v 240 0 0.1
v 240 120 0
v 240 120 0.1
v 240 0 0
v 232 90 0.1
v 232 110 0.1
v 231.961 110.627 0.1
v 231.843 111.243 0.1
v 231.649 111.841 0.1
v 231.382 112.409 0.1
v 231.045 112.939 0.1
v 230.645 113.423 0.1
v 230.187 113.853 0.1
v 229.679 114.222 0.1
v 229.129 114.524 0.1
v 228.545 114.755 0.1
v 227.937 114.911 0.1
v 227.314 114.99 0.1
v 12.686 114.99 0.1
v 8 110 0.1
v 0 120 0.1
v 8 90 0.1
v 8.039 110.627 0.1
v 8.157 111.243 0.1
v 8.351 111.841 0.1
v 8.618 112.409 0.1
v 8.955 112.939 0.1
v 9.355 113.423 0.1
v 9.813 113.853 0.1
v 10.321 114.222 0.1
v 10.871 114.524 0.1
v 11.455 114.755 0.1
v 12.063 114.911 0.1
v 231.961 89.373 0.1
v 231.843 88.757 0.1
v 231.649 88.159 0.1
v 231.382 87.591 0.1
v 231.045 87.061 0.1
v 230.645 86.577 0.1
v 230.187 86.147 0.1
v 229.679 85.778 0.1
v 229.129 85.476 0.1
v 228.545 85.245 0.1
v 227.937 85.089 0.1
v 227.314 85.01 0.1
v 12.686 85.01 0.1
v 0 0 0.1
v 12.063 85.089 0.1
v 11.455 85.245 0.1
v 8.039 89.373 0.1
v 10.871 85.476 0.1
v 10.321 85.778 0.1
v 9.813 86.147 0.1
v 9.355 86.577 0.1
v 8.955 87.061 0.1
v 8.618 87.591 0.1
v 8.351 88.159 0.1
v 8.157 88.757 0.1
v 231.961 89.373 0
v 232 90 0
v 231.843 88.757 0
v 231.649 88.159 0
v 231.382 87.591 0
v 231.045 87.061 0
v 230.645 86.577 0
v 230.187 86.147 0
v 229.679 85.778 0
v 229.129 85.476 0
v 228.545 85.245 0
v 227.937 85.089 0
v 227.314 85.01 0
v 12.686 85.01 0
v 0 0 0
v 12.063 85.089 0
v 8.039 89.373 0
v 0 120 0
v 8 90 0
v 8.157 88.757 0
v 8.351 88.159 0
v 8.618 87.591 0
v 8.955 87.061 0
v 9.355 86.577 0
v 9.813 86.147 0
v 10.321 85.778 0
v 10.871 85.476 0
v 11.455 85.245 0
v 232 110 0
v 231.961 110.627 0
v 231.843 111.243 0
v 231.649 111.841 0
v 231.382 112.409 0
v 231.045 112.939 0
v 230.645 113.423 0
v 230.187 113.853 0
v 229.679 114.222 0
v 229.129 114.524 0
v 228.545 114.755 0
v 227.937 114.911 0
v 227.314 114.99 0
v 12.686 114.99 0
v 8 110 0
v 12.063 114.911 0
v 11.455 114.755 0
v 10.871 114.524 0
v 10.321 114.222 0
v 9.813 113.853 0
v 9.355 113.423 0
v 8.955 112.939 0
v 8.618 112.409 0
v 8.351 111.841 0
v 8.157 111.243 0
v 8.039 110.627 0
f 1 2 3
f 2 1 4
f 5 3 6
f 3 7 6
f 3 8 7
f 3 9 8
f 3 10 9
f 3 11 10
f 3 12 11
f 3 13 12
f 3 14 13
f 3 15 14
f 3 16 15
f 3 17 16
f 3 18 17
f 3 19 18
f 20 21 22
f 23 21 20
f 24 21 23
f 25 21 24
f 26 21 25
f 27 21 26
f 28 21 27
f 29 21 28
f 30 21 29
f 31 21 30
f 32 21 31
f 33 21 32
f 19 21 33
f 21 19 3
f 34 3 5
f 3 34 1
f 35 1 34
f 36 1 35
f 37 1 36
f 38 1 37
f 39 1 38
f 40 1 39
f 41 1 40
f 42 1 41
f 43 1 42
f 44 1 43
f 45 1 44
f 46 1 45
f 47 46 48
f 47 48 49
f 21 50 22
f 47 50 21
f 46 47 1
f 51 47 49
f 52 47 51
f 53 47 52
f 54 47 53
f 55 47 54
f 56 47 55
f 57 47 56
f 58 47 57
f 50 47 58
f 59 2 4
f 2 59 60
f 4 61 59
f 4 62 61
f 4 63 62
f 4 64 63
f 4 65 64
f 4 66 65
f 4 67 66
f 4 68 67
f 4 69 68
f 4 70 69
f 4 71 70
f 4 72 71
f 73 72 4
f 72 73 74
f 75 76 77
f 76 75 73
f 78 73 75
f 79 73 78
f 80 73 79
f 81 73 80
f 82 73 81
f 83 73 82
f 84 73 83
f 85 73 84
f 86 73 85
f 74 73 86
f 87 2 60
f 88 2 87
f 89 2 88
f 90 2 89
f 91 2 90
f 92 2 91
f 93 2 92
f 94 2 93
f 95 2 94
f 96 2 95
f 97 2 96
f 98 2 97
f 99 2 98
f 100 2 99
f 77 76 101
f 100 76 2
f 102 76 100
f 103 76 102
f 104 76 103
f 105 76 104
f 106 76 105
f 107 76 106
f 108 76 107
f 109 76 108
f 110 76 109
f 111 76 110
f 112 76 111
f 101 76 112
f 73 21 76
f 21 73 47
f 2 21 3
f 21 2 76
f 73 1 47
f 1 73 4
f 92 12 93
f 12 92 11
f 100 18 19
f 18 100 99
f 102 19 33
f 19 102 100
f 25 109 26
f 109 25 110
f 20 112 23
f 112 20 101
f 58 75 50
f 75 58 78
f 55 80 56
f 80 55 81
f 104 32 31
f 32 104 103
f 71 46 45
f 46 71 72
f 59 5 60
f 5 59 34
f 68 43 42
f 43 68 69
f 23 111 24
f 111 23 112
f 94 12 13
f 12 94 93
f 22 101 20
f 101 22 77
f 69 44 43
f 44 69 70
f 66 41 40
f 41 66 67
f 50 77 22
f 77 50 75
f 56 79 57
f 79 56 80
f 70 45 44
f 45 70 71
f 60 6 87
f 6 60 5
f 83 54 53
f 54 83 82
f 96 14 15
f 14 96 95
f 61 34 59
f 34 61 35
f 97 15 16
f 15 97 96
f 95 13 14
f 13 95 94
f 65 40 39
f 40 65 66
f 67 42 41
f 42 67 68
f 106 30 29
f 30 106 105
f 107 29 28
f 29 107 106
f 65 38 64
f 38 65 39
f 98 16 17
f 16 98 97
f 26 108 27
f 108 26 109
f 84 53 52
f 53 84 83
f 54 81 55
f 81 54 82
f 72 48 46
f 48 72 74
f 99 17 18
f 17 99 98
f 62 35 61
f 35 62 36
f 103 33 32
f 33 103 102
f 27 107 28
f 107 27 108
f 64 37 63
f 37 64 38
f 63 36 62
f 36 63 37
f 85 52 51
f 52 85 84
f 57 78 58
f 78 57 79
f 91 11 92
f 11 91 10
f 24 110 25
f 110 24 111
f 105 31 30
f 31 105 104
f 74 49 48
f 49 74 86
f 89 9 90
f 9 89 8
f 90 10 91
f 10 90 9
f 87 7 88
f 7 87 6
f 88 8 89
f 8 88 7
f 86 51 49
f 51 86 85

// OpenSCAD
// -*- mode: c -*-
/* All distances are in mm. */

/* set output quality */
$fn = 50;

/* Distance between key centers. */
column_spacing   = 19;
row_spacing      = column_spacing;

/* This number should exceed row_spacing and column_spacing. The
 default gives a 1mm = (20mm - 19mm) gap between keycaps and cuts in
 the top plate.*/
key_hole_size = 20;

/* rotation angle; the angle between the halves is twice this
   number */
angle = 10;

/* The radius of screw holes. Holes will be slightly bigger due
   to the cut width. */
screw_hole_radius = 1.5;
/* Each screw hole is a hole in a "washer". How big these "washers"
   should be depends on the material used: this parameter and the
   `switch_hole_size` determine the spacer wall thickness. */
washer_radius     = 4 * screw_hole_radius;

/* This constant allows tweaking the location of the screw holes near
   the USB cable. Only useful with small `angle` values. Try the value
   of 10 with angle=0. */
back_screw_hole_offset = 0;

/* Distance between halves. */
hand_separation        = 0;

/* The approximate size of switch holes. Used to determine how
   thick walls can be, i.e. how much room around each switch hole to
   leave. See spacer(). */
switch_hole_size = 14;

/* Sets whether the case should use notched holes. As far as I can
   tell these notches are not all that useful... */
use_notched_holes = true;

/* Number of rows and columns in the matrix. You need to update
   staggering_offsets if you change n_cols. */
n_rows = 4;
n_cols = 5;

/* Number of thumb keys (per hand), try 1 or 2. */
n_thumb_keys = 1;

/* The width of the USB cable hole in the spacer. */
cable_hole_width = 12;

/* Vertical column staggering offsets. The first element should
   be zero. */
staggering_offsets = [0, 5, 11, 6, 3];

/* Whether or not to split the spacer into quarters. */
quarter_spacer = false;

/* Where the top/bottom split of a quartered spacer will be. */
spacer_quartering_offset = 60;

module rz(angle, center=undef) {
  /* Rotate children `angle` degrees around `center`. */
  translate(center) {
    rotate(angle) {
      translate(-center) {
        for (i=[0:$children-1])
          children(i);
      }
    }
  }
}

/* Compute coordinates of a point obtained by rotating p angle degrees
   around center. Used to compute locations of screw holes near the
   USB cable hole. */
function rz_fun(p, angle, center) = [cos(angle) * (p[0] - center[0]) - sin(angle) * (p[1] - center[1]) + center[0],
                                     sin(angle) * (p[0] - center[0]) + cos(angle) * (p[1] - center[1])+ center[1]];

module switch_hole(position, notches=use_notched_holes) {
  /* Cherry MX switch hole with the center at `position`. Sizes come
     from the ErgoDox design. */
  hole_size    = 13.97;
  notch_width  = 3.5001;
  notch_offset = 4.2545;
  notch_depth  = 0.8128;
  translate(position) {
    union() {
      square([hole_size, hole_size], center=true);
      if (notches == true) {
        translate([0, notch_offset]) {
          square([hole_size+2*notch_depth, notch_width], center=true);
        }
        translate([0, -notch_offset]) {
          square([hole_size+2*notch_depth, notch_width], center=true);
        }
      }
    }
  }
};

module regular_key(position, size) {
  /* Create a hole for a regular key. */
  translate(position) {
    square([size, size], center=true);
  }
}

module thumb_key(position, size) {
  /* Create a hole for a 1x1.5 unit thumb key. */
  translate(position) {
    scale([1, 1.5]) {
      translate(-position) {
        regular_key(position, size);
      }
    }
  }
}

module column (bottom_position, switch_holes, key_size=key_hole_size) {
  /* Create a column of keys. */
  translate(bottom_position) {
    for (i = [0:(n_rows-1)]) {
      if (switch_holes == true) {
        switch_hole([0, i*column_spacing]);
      } else {
        regular_key([0, i*column_spacing], key_size);
      }
    }
  }
}

module rotate_half() {
  /* Rotate the right half of the keys around the top left corner of
     the thumb key. Assumes that the thumb key is a 1x1.5 key and that
     it is shifted 0.5*column_spacing up relative to the nearest column. */
  rotation_y_offset = 1.75 * column_spacing;
  for (i=[0:$children-1]) {
    rz(angle, [hand_separation, rotation_y_offset]) {
      children(i);
    }
  }
}

module add_hand_separation() {
  /* Shift everything right to get desired hand separation. */
  for (i=[0:$children-1]) {
    translate([0.5*hand_separation, /* we get back the full separation
                                       because of mirroring */
               0]) children(i);
  }
}

module right_half (switch_holes=true, key_size=key_hole_size) {
  /* Create switch holes or key holes for the right half of the
     keyboard. Different key_sizes are used in top_plate() and
     spacer(). */
  x_offset = 0.5 * row_spacing;
  y_offset = 0.5 * column_spacing;
  thumb_key_offset = y_offset + 0.5 * column_spacing;
  rotate_half() {
    add_hand_separation() {
      for (j=[0:(n_thumb_keys-1)]) {
        if (switch_holes == true) {
          switch_hole([x_offset + j*row_spacing, thumb_key_offset]);
        } else {
          thumb_key([x_offset + j*row_spacing, thumb_key_offset], key_size);
        }
      }
      for (j=[0:(n_cols-1)]) {
        column([x_offset + (j+n_thumb_keys)*row_spacing, y_offset + staggering_offsets[j]], switch_holes, key_size);
      }
    }
  }
}

module screw_hole(radius, offset_radius, position, direction) {
  /* Create a screw hole of radius `radius` at a location
     `offset_radius` from `position`, (diagonally), in the direction
     `direction`. Oh, what a mess this is. */
  /* direction is the 2-element vector specifying to which side of
     position to move to, [-1, -1] for bottom left, etc. */

  /* radius_offset is the offset in the x (or y) direction so that
     we're offset_radius from position */
  radius_offset = offset_radius / sqrt(2);
  /* key_hole_offset if the difference between key spacing and key
     hole edge */
  key_hole_offset = 0.5*(row_spacing - key_hole_size);
  x = position[0] + (radius_offset - key_hole_offset) * direction[0];
  y = position[1] + (radius_offset - key_hole_offset) * direction[1];
  translate([x,y]) {
    circle(radius);
  }
}

module right_screw_holes(hole_radius) {
  /* coordinates of the back right screw hole before rotation... */
  back_right = [(n_cols+n_thumb_keys)*row_spacing,
               staggering_offsets[n_cols-1] + n_rows * column_spacing];
  /* and after */
  tmp = rz_fun(back_right, angle, [0, 2.25*column_spacing]);

  nudge = 0.75;

  rotate_half() {
    add_hand_separation() {
      screw_hole(hole_radius, washer_radius,
                 [row_spacing, 0],
                 [-nudge, -nudge]);
      screw_hole(hole_radius, washer_radius,
                 [(n_cols+n_thumb_keys)*row_spacing, staggering_offsets[n_cols-1]],
                 [nudge, -nudge]);
      screw_hole(hole_radius, washer_radius,
                 back_right,
                 [nudge, nudge]);
    }
  }

  /* add the screw hole near the cable hole */
  translate([washer_radius - tmp[0] - 0.5*hand_separation,
             back_screw_hole_offset]) {
    rotate_half() {
      add_hand_separation() {
        screw_hole(hole_radius,
                   washer_radius,
                   back_right,
                   [nudge, nudge]);
      }
    }
  }
}

module screw_holes(hole_radius) {
  /* Create all the screw holes. */
  right_screw_holes(hole_radius);
  mirror ([1,0,0]) { right_screw_holes(hole_radius); }
}

module left_half(switch_holes=true, key_size=key_hole_size) {
  mirror ([1,0,0]) { right_half(switch_holes, key_size); }
}

module bottom_plate() {
  /* bottom layer of the case */
  difference() {
    hull() { screw_holes(washer_radius); }
    screw_holes(screw_hole_radius);
  }
}

module top_plate() {
  /* top layer of the case */
  difference() {
    bottom_plate();
    right_half(false);
    left_half(false);
  }
}

module switch_plate() {
  /* the switch plate */
  difference() {
    bottom_plate();
    right_half();
    left_half();
  }
}

module spacer() {
  /* Create a spacer. */
  difference() {
    union() {
      difference() {
        bottom_plate();
        hull() {
          right_half(switch_holes=false, key_size=switch_hole_size + 3);
          left_half(switch_holes=false, key_size=switch_hole_size + 3);
        }
    /* add the USB cable hole: */
    translate([-0.5*cable_hole_width, 2*column_spacing]) {
      square([cable_hole_width, (2*n_rows) * column_spacing]);
    }
      }
      screw_holes(washer_radius);
    }
    screw_holes(screw_hole_radius);
  }
}

module spacer_quadrant(spacer_quadrant_number) {
  /* Cut a quarter of a spacer. */
  translate([0, spacer_quartering_offset]) {
    intersection() {
      translate([0, -spacer_quartering_offset]) { spacer(); }
      rotate([0, 0, spacer_quadrant_number * 90]) { square([1000, 1000]); }
    }
  }
}

module quartered_spacer()
{
  /* Assemble all four quarters of a spacer. */
  spacer_quadrant(0);
  spacer_quadrant(1);
  translate([-5,-10]) spacer_quadrant(2);
  translate([5,-10]) spacer_quadrant(3);
}

/* Create all four layers. 
top_plate();
translate([300, 0]) { switch_plate(); }
translate([0, 150]) { bottom_plate(); }
translate([300, 150]) {
  if (quarter_spacer == true) {
    quartered_spacer();
  }
  else {
    spacer();
  }
}
*/


// More information: https://danielupshaw.com/openscad-rounded-corners/

// Set to 0.01 for higher definition curves (renders slower)
$fs = 0.15;

module roundedcube(size = [1, 1, 1], center = false, radius = 0.5, apply_to = "all") {
	// If single value, convert to [x, y, z] vector
	size = (size[0] == undef) ? [size, size, size] : size;

	translate_min = radius;
	translate_xmax = size[0] - radius;
	translate_ymax = size[1] - radius;
	translate_zmax = size[2] - radius;

	diameter = radius * 2;

	obj_translate = (center == false) ?
		[0, 0, 0] : [
			-(size[0] / 2),
			-(size[1] / 2),
			-(size[2] / 2)
		];

	translate(v = obj_translate) {
		hull() {
			for (translate_x = [translate_min, translate_xmax]) {
				x_at = (translate_x == translate_min) ? "min" : "max";
				for (translate_y = [translate_min, translate_ymax]) {
					y_at = (translate_y == translate_min) ? "min" : "max";
					for (translate_z = [translate_min, translate_zmax]) {
						z_at = (translate_z == translate_min) ? "min" : "max";

						translate(v = [translate_x, translate_y, translate_z])
						if (
							(apply_to == "all") ||
							(apply_to == "xmin" && x_at == "min") || (apply_to == "xmax" && x_at == "max") ||
							(apply_to == "ymin" && y_at == "min") || (apply_to == "ymax" && y_at == "max") ||
							(apply_to == "zmin" && z_at == "min") || (apply_to == "zmax" && z_at == "max")
						) {
							sphere(r = radius);
						} else {
							rotate = 
								(apply_to == "xmin" || apply_to == "xmax" || apply_to == "x") ? [0, 90, 0] : (
								(apply_to == "ymin" || apply_to == "ymax" || apply_to == "y") ? [90, 90, 0] :
								[0, 0, 0]
							);
							rotate(a = rotate)
							cylinder(h = diameter, r = radius, center = true);
						}
					}
				}
			}
		}
	}
}



difference() {
    cube([240, 120, .1]);
    union() {
        for (j=[0:11]) {
            switch_hole([15 + j*row_spacing, 15]);
            switch_hole([15 + j*row_spacing, 15+19]);
            switch_hole([15 + j*row_spacing, 15+19+19]);
            switch_hole([15 + j*row_spacing, 15+19+19+19]);
        }
    }
    hull() {
        translate([13, 90]) { cylinder(h=10, r=5, center=true); }
        translate([240-13, 90]) { cylinder(h=10, r=5, center=true); }
        translate([13, 110]) { cylinder(h=10, r=5, center=true); }
        translate([240-13, 110]) { cylinder(h=10, r=5, center=true); }
    }
}
